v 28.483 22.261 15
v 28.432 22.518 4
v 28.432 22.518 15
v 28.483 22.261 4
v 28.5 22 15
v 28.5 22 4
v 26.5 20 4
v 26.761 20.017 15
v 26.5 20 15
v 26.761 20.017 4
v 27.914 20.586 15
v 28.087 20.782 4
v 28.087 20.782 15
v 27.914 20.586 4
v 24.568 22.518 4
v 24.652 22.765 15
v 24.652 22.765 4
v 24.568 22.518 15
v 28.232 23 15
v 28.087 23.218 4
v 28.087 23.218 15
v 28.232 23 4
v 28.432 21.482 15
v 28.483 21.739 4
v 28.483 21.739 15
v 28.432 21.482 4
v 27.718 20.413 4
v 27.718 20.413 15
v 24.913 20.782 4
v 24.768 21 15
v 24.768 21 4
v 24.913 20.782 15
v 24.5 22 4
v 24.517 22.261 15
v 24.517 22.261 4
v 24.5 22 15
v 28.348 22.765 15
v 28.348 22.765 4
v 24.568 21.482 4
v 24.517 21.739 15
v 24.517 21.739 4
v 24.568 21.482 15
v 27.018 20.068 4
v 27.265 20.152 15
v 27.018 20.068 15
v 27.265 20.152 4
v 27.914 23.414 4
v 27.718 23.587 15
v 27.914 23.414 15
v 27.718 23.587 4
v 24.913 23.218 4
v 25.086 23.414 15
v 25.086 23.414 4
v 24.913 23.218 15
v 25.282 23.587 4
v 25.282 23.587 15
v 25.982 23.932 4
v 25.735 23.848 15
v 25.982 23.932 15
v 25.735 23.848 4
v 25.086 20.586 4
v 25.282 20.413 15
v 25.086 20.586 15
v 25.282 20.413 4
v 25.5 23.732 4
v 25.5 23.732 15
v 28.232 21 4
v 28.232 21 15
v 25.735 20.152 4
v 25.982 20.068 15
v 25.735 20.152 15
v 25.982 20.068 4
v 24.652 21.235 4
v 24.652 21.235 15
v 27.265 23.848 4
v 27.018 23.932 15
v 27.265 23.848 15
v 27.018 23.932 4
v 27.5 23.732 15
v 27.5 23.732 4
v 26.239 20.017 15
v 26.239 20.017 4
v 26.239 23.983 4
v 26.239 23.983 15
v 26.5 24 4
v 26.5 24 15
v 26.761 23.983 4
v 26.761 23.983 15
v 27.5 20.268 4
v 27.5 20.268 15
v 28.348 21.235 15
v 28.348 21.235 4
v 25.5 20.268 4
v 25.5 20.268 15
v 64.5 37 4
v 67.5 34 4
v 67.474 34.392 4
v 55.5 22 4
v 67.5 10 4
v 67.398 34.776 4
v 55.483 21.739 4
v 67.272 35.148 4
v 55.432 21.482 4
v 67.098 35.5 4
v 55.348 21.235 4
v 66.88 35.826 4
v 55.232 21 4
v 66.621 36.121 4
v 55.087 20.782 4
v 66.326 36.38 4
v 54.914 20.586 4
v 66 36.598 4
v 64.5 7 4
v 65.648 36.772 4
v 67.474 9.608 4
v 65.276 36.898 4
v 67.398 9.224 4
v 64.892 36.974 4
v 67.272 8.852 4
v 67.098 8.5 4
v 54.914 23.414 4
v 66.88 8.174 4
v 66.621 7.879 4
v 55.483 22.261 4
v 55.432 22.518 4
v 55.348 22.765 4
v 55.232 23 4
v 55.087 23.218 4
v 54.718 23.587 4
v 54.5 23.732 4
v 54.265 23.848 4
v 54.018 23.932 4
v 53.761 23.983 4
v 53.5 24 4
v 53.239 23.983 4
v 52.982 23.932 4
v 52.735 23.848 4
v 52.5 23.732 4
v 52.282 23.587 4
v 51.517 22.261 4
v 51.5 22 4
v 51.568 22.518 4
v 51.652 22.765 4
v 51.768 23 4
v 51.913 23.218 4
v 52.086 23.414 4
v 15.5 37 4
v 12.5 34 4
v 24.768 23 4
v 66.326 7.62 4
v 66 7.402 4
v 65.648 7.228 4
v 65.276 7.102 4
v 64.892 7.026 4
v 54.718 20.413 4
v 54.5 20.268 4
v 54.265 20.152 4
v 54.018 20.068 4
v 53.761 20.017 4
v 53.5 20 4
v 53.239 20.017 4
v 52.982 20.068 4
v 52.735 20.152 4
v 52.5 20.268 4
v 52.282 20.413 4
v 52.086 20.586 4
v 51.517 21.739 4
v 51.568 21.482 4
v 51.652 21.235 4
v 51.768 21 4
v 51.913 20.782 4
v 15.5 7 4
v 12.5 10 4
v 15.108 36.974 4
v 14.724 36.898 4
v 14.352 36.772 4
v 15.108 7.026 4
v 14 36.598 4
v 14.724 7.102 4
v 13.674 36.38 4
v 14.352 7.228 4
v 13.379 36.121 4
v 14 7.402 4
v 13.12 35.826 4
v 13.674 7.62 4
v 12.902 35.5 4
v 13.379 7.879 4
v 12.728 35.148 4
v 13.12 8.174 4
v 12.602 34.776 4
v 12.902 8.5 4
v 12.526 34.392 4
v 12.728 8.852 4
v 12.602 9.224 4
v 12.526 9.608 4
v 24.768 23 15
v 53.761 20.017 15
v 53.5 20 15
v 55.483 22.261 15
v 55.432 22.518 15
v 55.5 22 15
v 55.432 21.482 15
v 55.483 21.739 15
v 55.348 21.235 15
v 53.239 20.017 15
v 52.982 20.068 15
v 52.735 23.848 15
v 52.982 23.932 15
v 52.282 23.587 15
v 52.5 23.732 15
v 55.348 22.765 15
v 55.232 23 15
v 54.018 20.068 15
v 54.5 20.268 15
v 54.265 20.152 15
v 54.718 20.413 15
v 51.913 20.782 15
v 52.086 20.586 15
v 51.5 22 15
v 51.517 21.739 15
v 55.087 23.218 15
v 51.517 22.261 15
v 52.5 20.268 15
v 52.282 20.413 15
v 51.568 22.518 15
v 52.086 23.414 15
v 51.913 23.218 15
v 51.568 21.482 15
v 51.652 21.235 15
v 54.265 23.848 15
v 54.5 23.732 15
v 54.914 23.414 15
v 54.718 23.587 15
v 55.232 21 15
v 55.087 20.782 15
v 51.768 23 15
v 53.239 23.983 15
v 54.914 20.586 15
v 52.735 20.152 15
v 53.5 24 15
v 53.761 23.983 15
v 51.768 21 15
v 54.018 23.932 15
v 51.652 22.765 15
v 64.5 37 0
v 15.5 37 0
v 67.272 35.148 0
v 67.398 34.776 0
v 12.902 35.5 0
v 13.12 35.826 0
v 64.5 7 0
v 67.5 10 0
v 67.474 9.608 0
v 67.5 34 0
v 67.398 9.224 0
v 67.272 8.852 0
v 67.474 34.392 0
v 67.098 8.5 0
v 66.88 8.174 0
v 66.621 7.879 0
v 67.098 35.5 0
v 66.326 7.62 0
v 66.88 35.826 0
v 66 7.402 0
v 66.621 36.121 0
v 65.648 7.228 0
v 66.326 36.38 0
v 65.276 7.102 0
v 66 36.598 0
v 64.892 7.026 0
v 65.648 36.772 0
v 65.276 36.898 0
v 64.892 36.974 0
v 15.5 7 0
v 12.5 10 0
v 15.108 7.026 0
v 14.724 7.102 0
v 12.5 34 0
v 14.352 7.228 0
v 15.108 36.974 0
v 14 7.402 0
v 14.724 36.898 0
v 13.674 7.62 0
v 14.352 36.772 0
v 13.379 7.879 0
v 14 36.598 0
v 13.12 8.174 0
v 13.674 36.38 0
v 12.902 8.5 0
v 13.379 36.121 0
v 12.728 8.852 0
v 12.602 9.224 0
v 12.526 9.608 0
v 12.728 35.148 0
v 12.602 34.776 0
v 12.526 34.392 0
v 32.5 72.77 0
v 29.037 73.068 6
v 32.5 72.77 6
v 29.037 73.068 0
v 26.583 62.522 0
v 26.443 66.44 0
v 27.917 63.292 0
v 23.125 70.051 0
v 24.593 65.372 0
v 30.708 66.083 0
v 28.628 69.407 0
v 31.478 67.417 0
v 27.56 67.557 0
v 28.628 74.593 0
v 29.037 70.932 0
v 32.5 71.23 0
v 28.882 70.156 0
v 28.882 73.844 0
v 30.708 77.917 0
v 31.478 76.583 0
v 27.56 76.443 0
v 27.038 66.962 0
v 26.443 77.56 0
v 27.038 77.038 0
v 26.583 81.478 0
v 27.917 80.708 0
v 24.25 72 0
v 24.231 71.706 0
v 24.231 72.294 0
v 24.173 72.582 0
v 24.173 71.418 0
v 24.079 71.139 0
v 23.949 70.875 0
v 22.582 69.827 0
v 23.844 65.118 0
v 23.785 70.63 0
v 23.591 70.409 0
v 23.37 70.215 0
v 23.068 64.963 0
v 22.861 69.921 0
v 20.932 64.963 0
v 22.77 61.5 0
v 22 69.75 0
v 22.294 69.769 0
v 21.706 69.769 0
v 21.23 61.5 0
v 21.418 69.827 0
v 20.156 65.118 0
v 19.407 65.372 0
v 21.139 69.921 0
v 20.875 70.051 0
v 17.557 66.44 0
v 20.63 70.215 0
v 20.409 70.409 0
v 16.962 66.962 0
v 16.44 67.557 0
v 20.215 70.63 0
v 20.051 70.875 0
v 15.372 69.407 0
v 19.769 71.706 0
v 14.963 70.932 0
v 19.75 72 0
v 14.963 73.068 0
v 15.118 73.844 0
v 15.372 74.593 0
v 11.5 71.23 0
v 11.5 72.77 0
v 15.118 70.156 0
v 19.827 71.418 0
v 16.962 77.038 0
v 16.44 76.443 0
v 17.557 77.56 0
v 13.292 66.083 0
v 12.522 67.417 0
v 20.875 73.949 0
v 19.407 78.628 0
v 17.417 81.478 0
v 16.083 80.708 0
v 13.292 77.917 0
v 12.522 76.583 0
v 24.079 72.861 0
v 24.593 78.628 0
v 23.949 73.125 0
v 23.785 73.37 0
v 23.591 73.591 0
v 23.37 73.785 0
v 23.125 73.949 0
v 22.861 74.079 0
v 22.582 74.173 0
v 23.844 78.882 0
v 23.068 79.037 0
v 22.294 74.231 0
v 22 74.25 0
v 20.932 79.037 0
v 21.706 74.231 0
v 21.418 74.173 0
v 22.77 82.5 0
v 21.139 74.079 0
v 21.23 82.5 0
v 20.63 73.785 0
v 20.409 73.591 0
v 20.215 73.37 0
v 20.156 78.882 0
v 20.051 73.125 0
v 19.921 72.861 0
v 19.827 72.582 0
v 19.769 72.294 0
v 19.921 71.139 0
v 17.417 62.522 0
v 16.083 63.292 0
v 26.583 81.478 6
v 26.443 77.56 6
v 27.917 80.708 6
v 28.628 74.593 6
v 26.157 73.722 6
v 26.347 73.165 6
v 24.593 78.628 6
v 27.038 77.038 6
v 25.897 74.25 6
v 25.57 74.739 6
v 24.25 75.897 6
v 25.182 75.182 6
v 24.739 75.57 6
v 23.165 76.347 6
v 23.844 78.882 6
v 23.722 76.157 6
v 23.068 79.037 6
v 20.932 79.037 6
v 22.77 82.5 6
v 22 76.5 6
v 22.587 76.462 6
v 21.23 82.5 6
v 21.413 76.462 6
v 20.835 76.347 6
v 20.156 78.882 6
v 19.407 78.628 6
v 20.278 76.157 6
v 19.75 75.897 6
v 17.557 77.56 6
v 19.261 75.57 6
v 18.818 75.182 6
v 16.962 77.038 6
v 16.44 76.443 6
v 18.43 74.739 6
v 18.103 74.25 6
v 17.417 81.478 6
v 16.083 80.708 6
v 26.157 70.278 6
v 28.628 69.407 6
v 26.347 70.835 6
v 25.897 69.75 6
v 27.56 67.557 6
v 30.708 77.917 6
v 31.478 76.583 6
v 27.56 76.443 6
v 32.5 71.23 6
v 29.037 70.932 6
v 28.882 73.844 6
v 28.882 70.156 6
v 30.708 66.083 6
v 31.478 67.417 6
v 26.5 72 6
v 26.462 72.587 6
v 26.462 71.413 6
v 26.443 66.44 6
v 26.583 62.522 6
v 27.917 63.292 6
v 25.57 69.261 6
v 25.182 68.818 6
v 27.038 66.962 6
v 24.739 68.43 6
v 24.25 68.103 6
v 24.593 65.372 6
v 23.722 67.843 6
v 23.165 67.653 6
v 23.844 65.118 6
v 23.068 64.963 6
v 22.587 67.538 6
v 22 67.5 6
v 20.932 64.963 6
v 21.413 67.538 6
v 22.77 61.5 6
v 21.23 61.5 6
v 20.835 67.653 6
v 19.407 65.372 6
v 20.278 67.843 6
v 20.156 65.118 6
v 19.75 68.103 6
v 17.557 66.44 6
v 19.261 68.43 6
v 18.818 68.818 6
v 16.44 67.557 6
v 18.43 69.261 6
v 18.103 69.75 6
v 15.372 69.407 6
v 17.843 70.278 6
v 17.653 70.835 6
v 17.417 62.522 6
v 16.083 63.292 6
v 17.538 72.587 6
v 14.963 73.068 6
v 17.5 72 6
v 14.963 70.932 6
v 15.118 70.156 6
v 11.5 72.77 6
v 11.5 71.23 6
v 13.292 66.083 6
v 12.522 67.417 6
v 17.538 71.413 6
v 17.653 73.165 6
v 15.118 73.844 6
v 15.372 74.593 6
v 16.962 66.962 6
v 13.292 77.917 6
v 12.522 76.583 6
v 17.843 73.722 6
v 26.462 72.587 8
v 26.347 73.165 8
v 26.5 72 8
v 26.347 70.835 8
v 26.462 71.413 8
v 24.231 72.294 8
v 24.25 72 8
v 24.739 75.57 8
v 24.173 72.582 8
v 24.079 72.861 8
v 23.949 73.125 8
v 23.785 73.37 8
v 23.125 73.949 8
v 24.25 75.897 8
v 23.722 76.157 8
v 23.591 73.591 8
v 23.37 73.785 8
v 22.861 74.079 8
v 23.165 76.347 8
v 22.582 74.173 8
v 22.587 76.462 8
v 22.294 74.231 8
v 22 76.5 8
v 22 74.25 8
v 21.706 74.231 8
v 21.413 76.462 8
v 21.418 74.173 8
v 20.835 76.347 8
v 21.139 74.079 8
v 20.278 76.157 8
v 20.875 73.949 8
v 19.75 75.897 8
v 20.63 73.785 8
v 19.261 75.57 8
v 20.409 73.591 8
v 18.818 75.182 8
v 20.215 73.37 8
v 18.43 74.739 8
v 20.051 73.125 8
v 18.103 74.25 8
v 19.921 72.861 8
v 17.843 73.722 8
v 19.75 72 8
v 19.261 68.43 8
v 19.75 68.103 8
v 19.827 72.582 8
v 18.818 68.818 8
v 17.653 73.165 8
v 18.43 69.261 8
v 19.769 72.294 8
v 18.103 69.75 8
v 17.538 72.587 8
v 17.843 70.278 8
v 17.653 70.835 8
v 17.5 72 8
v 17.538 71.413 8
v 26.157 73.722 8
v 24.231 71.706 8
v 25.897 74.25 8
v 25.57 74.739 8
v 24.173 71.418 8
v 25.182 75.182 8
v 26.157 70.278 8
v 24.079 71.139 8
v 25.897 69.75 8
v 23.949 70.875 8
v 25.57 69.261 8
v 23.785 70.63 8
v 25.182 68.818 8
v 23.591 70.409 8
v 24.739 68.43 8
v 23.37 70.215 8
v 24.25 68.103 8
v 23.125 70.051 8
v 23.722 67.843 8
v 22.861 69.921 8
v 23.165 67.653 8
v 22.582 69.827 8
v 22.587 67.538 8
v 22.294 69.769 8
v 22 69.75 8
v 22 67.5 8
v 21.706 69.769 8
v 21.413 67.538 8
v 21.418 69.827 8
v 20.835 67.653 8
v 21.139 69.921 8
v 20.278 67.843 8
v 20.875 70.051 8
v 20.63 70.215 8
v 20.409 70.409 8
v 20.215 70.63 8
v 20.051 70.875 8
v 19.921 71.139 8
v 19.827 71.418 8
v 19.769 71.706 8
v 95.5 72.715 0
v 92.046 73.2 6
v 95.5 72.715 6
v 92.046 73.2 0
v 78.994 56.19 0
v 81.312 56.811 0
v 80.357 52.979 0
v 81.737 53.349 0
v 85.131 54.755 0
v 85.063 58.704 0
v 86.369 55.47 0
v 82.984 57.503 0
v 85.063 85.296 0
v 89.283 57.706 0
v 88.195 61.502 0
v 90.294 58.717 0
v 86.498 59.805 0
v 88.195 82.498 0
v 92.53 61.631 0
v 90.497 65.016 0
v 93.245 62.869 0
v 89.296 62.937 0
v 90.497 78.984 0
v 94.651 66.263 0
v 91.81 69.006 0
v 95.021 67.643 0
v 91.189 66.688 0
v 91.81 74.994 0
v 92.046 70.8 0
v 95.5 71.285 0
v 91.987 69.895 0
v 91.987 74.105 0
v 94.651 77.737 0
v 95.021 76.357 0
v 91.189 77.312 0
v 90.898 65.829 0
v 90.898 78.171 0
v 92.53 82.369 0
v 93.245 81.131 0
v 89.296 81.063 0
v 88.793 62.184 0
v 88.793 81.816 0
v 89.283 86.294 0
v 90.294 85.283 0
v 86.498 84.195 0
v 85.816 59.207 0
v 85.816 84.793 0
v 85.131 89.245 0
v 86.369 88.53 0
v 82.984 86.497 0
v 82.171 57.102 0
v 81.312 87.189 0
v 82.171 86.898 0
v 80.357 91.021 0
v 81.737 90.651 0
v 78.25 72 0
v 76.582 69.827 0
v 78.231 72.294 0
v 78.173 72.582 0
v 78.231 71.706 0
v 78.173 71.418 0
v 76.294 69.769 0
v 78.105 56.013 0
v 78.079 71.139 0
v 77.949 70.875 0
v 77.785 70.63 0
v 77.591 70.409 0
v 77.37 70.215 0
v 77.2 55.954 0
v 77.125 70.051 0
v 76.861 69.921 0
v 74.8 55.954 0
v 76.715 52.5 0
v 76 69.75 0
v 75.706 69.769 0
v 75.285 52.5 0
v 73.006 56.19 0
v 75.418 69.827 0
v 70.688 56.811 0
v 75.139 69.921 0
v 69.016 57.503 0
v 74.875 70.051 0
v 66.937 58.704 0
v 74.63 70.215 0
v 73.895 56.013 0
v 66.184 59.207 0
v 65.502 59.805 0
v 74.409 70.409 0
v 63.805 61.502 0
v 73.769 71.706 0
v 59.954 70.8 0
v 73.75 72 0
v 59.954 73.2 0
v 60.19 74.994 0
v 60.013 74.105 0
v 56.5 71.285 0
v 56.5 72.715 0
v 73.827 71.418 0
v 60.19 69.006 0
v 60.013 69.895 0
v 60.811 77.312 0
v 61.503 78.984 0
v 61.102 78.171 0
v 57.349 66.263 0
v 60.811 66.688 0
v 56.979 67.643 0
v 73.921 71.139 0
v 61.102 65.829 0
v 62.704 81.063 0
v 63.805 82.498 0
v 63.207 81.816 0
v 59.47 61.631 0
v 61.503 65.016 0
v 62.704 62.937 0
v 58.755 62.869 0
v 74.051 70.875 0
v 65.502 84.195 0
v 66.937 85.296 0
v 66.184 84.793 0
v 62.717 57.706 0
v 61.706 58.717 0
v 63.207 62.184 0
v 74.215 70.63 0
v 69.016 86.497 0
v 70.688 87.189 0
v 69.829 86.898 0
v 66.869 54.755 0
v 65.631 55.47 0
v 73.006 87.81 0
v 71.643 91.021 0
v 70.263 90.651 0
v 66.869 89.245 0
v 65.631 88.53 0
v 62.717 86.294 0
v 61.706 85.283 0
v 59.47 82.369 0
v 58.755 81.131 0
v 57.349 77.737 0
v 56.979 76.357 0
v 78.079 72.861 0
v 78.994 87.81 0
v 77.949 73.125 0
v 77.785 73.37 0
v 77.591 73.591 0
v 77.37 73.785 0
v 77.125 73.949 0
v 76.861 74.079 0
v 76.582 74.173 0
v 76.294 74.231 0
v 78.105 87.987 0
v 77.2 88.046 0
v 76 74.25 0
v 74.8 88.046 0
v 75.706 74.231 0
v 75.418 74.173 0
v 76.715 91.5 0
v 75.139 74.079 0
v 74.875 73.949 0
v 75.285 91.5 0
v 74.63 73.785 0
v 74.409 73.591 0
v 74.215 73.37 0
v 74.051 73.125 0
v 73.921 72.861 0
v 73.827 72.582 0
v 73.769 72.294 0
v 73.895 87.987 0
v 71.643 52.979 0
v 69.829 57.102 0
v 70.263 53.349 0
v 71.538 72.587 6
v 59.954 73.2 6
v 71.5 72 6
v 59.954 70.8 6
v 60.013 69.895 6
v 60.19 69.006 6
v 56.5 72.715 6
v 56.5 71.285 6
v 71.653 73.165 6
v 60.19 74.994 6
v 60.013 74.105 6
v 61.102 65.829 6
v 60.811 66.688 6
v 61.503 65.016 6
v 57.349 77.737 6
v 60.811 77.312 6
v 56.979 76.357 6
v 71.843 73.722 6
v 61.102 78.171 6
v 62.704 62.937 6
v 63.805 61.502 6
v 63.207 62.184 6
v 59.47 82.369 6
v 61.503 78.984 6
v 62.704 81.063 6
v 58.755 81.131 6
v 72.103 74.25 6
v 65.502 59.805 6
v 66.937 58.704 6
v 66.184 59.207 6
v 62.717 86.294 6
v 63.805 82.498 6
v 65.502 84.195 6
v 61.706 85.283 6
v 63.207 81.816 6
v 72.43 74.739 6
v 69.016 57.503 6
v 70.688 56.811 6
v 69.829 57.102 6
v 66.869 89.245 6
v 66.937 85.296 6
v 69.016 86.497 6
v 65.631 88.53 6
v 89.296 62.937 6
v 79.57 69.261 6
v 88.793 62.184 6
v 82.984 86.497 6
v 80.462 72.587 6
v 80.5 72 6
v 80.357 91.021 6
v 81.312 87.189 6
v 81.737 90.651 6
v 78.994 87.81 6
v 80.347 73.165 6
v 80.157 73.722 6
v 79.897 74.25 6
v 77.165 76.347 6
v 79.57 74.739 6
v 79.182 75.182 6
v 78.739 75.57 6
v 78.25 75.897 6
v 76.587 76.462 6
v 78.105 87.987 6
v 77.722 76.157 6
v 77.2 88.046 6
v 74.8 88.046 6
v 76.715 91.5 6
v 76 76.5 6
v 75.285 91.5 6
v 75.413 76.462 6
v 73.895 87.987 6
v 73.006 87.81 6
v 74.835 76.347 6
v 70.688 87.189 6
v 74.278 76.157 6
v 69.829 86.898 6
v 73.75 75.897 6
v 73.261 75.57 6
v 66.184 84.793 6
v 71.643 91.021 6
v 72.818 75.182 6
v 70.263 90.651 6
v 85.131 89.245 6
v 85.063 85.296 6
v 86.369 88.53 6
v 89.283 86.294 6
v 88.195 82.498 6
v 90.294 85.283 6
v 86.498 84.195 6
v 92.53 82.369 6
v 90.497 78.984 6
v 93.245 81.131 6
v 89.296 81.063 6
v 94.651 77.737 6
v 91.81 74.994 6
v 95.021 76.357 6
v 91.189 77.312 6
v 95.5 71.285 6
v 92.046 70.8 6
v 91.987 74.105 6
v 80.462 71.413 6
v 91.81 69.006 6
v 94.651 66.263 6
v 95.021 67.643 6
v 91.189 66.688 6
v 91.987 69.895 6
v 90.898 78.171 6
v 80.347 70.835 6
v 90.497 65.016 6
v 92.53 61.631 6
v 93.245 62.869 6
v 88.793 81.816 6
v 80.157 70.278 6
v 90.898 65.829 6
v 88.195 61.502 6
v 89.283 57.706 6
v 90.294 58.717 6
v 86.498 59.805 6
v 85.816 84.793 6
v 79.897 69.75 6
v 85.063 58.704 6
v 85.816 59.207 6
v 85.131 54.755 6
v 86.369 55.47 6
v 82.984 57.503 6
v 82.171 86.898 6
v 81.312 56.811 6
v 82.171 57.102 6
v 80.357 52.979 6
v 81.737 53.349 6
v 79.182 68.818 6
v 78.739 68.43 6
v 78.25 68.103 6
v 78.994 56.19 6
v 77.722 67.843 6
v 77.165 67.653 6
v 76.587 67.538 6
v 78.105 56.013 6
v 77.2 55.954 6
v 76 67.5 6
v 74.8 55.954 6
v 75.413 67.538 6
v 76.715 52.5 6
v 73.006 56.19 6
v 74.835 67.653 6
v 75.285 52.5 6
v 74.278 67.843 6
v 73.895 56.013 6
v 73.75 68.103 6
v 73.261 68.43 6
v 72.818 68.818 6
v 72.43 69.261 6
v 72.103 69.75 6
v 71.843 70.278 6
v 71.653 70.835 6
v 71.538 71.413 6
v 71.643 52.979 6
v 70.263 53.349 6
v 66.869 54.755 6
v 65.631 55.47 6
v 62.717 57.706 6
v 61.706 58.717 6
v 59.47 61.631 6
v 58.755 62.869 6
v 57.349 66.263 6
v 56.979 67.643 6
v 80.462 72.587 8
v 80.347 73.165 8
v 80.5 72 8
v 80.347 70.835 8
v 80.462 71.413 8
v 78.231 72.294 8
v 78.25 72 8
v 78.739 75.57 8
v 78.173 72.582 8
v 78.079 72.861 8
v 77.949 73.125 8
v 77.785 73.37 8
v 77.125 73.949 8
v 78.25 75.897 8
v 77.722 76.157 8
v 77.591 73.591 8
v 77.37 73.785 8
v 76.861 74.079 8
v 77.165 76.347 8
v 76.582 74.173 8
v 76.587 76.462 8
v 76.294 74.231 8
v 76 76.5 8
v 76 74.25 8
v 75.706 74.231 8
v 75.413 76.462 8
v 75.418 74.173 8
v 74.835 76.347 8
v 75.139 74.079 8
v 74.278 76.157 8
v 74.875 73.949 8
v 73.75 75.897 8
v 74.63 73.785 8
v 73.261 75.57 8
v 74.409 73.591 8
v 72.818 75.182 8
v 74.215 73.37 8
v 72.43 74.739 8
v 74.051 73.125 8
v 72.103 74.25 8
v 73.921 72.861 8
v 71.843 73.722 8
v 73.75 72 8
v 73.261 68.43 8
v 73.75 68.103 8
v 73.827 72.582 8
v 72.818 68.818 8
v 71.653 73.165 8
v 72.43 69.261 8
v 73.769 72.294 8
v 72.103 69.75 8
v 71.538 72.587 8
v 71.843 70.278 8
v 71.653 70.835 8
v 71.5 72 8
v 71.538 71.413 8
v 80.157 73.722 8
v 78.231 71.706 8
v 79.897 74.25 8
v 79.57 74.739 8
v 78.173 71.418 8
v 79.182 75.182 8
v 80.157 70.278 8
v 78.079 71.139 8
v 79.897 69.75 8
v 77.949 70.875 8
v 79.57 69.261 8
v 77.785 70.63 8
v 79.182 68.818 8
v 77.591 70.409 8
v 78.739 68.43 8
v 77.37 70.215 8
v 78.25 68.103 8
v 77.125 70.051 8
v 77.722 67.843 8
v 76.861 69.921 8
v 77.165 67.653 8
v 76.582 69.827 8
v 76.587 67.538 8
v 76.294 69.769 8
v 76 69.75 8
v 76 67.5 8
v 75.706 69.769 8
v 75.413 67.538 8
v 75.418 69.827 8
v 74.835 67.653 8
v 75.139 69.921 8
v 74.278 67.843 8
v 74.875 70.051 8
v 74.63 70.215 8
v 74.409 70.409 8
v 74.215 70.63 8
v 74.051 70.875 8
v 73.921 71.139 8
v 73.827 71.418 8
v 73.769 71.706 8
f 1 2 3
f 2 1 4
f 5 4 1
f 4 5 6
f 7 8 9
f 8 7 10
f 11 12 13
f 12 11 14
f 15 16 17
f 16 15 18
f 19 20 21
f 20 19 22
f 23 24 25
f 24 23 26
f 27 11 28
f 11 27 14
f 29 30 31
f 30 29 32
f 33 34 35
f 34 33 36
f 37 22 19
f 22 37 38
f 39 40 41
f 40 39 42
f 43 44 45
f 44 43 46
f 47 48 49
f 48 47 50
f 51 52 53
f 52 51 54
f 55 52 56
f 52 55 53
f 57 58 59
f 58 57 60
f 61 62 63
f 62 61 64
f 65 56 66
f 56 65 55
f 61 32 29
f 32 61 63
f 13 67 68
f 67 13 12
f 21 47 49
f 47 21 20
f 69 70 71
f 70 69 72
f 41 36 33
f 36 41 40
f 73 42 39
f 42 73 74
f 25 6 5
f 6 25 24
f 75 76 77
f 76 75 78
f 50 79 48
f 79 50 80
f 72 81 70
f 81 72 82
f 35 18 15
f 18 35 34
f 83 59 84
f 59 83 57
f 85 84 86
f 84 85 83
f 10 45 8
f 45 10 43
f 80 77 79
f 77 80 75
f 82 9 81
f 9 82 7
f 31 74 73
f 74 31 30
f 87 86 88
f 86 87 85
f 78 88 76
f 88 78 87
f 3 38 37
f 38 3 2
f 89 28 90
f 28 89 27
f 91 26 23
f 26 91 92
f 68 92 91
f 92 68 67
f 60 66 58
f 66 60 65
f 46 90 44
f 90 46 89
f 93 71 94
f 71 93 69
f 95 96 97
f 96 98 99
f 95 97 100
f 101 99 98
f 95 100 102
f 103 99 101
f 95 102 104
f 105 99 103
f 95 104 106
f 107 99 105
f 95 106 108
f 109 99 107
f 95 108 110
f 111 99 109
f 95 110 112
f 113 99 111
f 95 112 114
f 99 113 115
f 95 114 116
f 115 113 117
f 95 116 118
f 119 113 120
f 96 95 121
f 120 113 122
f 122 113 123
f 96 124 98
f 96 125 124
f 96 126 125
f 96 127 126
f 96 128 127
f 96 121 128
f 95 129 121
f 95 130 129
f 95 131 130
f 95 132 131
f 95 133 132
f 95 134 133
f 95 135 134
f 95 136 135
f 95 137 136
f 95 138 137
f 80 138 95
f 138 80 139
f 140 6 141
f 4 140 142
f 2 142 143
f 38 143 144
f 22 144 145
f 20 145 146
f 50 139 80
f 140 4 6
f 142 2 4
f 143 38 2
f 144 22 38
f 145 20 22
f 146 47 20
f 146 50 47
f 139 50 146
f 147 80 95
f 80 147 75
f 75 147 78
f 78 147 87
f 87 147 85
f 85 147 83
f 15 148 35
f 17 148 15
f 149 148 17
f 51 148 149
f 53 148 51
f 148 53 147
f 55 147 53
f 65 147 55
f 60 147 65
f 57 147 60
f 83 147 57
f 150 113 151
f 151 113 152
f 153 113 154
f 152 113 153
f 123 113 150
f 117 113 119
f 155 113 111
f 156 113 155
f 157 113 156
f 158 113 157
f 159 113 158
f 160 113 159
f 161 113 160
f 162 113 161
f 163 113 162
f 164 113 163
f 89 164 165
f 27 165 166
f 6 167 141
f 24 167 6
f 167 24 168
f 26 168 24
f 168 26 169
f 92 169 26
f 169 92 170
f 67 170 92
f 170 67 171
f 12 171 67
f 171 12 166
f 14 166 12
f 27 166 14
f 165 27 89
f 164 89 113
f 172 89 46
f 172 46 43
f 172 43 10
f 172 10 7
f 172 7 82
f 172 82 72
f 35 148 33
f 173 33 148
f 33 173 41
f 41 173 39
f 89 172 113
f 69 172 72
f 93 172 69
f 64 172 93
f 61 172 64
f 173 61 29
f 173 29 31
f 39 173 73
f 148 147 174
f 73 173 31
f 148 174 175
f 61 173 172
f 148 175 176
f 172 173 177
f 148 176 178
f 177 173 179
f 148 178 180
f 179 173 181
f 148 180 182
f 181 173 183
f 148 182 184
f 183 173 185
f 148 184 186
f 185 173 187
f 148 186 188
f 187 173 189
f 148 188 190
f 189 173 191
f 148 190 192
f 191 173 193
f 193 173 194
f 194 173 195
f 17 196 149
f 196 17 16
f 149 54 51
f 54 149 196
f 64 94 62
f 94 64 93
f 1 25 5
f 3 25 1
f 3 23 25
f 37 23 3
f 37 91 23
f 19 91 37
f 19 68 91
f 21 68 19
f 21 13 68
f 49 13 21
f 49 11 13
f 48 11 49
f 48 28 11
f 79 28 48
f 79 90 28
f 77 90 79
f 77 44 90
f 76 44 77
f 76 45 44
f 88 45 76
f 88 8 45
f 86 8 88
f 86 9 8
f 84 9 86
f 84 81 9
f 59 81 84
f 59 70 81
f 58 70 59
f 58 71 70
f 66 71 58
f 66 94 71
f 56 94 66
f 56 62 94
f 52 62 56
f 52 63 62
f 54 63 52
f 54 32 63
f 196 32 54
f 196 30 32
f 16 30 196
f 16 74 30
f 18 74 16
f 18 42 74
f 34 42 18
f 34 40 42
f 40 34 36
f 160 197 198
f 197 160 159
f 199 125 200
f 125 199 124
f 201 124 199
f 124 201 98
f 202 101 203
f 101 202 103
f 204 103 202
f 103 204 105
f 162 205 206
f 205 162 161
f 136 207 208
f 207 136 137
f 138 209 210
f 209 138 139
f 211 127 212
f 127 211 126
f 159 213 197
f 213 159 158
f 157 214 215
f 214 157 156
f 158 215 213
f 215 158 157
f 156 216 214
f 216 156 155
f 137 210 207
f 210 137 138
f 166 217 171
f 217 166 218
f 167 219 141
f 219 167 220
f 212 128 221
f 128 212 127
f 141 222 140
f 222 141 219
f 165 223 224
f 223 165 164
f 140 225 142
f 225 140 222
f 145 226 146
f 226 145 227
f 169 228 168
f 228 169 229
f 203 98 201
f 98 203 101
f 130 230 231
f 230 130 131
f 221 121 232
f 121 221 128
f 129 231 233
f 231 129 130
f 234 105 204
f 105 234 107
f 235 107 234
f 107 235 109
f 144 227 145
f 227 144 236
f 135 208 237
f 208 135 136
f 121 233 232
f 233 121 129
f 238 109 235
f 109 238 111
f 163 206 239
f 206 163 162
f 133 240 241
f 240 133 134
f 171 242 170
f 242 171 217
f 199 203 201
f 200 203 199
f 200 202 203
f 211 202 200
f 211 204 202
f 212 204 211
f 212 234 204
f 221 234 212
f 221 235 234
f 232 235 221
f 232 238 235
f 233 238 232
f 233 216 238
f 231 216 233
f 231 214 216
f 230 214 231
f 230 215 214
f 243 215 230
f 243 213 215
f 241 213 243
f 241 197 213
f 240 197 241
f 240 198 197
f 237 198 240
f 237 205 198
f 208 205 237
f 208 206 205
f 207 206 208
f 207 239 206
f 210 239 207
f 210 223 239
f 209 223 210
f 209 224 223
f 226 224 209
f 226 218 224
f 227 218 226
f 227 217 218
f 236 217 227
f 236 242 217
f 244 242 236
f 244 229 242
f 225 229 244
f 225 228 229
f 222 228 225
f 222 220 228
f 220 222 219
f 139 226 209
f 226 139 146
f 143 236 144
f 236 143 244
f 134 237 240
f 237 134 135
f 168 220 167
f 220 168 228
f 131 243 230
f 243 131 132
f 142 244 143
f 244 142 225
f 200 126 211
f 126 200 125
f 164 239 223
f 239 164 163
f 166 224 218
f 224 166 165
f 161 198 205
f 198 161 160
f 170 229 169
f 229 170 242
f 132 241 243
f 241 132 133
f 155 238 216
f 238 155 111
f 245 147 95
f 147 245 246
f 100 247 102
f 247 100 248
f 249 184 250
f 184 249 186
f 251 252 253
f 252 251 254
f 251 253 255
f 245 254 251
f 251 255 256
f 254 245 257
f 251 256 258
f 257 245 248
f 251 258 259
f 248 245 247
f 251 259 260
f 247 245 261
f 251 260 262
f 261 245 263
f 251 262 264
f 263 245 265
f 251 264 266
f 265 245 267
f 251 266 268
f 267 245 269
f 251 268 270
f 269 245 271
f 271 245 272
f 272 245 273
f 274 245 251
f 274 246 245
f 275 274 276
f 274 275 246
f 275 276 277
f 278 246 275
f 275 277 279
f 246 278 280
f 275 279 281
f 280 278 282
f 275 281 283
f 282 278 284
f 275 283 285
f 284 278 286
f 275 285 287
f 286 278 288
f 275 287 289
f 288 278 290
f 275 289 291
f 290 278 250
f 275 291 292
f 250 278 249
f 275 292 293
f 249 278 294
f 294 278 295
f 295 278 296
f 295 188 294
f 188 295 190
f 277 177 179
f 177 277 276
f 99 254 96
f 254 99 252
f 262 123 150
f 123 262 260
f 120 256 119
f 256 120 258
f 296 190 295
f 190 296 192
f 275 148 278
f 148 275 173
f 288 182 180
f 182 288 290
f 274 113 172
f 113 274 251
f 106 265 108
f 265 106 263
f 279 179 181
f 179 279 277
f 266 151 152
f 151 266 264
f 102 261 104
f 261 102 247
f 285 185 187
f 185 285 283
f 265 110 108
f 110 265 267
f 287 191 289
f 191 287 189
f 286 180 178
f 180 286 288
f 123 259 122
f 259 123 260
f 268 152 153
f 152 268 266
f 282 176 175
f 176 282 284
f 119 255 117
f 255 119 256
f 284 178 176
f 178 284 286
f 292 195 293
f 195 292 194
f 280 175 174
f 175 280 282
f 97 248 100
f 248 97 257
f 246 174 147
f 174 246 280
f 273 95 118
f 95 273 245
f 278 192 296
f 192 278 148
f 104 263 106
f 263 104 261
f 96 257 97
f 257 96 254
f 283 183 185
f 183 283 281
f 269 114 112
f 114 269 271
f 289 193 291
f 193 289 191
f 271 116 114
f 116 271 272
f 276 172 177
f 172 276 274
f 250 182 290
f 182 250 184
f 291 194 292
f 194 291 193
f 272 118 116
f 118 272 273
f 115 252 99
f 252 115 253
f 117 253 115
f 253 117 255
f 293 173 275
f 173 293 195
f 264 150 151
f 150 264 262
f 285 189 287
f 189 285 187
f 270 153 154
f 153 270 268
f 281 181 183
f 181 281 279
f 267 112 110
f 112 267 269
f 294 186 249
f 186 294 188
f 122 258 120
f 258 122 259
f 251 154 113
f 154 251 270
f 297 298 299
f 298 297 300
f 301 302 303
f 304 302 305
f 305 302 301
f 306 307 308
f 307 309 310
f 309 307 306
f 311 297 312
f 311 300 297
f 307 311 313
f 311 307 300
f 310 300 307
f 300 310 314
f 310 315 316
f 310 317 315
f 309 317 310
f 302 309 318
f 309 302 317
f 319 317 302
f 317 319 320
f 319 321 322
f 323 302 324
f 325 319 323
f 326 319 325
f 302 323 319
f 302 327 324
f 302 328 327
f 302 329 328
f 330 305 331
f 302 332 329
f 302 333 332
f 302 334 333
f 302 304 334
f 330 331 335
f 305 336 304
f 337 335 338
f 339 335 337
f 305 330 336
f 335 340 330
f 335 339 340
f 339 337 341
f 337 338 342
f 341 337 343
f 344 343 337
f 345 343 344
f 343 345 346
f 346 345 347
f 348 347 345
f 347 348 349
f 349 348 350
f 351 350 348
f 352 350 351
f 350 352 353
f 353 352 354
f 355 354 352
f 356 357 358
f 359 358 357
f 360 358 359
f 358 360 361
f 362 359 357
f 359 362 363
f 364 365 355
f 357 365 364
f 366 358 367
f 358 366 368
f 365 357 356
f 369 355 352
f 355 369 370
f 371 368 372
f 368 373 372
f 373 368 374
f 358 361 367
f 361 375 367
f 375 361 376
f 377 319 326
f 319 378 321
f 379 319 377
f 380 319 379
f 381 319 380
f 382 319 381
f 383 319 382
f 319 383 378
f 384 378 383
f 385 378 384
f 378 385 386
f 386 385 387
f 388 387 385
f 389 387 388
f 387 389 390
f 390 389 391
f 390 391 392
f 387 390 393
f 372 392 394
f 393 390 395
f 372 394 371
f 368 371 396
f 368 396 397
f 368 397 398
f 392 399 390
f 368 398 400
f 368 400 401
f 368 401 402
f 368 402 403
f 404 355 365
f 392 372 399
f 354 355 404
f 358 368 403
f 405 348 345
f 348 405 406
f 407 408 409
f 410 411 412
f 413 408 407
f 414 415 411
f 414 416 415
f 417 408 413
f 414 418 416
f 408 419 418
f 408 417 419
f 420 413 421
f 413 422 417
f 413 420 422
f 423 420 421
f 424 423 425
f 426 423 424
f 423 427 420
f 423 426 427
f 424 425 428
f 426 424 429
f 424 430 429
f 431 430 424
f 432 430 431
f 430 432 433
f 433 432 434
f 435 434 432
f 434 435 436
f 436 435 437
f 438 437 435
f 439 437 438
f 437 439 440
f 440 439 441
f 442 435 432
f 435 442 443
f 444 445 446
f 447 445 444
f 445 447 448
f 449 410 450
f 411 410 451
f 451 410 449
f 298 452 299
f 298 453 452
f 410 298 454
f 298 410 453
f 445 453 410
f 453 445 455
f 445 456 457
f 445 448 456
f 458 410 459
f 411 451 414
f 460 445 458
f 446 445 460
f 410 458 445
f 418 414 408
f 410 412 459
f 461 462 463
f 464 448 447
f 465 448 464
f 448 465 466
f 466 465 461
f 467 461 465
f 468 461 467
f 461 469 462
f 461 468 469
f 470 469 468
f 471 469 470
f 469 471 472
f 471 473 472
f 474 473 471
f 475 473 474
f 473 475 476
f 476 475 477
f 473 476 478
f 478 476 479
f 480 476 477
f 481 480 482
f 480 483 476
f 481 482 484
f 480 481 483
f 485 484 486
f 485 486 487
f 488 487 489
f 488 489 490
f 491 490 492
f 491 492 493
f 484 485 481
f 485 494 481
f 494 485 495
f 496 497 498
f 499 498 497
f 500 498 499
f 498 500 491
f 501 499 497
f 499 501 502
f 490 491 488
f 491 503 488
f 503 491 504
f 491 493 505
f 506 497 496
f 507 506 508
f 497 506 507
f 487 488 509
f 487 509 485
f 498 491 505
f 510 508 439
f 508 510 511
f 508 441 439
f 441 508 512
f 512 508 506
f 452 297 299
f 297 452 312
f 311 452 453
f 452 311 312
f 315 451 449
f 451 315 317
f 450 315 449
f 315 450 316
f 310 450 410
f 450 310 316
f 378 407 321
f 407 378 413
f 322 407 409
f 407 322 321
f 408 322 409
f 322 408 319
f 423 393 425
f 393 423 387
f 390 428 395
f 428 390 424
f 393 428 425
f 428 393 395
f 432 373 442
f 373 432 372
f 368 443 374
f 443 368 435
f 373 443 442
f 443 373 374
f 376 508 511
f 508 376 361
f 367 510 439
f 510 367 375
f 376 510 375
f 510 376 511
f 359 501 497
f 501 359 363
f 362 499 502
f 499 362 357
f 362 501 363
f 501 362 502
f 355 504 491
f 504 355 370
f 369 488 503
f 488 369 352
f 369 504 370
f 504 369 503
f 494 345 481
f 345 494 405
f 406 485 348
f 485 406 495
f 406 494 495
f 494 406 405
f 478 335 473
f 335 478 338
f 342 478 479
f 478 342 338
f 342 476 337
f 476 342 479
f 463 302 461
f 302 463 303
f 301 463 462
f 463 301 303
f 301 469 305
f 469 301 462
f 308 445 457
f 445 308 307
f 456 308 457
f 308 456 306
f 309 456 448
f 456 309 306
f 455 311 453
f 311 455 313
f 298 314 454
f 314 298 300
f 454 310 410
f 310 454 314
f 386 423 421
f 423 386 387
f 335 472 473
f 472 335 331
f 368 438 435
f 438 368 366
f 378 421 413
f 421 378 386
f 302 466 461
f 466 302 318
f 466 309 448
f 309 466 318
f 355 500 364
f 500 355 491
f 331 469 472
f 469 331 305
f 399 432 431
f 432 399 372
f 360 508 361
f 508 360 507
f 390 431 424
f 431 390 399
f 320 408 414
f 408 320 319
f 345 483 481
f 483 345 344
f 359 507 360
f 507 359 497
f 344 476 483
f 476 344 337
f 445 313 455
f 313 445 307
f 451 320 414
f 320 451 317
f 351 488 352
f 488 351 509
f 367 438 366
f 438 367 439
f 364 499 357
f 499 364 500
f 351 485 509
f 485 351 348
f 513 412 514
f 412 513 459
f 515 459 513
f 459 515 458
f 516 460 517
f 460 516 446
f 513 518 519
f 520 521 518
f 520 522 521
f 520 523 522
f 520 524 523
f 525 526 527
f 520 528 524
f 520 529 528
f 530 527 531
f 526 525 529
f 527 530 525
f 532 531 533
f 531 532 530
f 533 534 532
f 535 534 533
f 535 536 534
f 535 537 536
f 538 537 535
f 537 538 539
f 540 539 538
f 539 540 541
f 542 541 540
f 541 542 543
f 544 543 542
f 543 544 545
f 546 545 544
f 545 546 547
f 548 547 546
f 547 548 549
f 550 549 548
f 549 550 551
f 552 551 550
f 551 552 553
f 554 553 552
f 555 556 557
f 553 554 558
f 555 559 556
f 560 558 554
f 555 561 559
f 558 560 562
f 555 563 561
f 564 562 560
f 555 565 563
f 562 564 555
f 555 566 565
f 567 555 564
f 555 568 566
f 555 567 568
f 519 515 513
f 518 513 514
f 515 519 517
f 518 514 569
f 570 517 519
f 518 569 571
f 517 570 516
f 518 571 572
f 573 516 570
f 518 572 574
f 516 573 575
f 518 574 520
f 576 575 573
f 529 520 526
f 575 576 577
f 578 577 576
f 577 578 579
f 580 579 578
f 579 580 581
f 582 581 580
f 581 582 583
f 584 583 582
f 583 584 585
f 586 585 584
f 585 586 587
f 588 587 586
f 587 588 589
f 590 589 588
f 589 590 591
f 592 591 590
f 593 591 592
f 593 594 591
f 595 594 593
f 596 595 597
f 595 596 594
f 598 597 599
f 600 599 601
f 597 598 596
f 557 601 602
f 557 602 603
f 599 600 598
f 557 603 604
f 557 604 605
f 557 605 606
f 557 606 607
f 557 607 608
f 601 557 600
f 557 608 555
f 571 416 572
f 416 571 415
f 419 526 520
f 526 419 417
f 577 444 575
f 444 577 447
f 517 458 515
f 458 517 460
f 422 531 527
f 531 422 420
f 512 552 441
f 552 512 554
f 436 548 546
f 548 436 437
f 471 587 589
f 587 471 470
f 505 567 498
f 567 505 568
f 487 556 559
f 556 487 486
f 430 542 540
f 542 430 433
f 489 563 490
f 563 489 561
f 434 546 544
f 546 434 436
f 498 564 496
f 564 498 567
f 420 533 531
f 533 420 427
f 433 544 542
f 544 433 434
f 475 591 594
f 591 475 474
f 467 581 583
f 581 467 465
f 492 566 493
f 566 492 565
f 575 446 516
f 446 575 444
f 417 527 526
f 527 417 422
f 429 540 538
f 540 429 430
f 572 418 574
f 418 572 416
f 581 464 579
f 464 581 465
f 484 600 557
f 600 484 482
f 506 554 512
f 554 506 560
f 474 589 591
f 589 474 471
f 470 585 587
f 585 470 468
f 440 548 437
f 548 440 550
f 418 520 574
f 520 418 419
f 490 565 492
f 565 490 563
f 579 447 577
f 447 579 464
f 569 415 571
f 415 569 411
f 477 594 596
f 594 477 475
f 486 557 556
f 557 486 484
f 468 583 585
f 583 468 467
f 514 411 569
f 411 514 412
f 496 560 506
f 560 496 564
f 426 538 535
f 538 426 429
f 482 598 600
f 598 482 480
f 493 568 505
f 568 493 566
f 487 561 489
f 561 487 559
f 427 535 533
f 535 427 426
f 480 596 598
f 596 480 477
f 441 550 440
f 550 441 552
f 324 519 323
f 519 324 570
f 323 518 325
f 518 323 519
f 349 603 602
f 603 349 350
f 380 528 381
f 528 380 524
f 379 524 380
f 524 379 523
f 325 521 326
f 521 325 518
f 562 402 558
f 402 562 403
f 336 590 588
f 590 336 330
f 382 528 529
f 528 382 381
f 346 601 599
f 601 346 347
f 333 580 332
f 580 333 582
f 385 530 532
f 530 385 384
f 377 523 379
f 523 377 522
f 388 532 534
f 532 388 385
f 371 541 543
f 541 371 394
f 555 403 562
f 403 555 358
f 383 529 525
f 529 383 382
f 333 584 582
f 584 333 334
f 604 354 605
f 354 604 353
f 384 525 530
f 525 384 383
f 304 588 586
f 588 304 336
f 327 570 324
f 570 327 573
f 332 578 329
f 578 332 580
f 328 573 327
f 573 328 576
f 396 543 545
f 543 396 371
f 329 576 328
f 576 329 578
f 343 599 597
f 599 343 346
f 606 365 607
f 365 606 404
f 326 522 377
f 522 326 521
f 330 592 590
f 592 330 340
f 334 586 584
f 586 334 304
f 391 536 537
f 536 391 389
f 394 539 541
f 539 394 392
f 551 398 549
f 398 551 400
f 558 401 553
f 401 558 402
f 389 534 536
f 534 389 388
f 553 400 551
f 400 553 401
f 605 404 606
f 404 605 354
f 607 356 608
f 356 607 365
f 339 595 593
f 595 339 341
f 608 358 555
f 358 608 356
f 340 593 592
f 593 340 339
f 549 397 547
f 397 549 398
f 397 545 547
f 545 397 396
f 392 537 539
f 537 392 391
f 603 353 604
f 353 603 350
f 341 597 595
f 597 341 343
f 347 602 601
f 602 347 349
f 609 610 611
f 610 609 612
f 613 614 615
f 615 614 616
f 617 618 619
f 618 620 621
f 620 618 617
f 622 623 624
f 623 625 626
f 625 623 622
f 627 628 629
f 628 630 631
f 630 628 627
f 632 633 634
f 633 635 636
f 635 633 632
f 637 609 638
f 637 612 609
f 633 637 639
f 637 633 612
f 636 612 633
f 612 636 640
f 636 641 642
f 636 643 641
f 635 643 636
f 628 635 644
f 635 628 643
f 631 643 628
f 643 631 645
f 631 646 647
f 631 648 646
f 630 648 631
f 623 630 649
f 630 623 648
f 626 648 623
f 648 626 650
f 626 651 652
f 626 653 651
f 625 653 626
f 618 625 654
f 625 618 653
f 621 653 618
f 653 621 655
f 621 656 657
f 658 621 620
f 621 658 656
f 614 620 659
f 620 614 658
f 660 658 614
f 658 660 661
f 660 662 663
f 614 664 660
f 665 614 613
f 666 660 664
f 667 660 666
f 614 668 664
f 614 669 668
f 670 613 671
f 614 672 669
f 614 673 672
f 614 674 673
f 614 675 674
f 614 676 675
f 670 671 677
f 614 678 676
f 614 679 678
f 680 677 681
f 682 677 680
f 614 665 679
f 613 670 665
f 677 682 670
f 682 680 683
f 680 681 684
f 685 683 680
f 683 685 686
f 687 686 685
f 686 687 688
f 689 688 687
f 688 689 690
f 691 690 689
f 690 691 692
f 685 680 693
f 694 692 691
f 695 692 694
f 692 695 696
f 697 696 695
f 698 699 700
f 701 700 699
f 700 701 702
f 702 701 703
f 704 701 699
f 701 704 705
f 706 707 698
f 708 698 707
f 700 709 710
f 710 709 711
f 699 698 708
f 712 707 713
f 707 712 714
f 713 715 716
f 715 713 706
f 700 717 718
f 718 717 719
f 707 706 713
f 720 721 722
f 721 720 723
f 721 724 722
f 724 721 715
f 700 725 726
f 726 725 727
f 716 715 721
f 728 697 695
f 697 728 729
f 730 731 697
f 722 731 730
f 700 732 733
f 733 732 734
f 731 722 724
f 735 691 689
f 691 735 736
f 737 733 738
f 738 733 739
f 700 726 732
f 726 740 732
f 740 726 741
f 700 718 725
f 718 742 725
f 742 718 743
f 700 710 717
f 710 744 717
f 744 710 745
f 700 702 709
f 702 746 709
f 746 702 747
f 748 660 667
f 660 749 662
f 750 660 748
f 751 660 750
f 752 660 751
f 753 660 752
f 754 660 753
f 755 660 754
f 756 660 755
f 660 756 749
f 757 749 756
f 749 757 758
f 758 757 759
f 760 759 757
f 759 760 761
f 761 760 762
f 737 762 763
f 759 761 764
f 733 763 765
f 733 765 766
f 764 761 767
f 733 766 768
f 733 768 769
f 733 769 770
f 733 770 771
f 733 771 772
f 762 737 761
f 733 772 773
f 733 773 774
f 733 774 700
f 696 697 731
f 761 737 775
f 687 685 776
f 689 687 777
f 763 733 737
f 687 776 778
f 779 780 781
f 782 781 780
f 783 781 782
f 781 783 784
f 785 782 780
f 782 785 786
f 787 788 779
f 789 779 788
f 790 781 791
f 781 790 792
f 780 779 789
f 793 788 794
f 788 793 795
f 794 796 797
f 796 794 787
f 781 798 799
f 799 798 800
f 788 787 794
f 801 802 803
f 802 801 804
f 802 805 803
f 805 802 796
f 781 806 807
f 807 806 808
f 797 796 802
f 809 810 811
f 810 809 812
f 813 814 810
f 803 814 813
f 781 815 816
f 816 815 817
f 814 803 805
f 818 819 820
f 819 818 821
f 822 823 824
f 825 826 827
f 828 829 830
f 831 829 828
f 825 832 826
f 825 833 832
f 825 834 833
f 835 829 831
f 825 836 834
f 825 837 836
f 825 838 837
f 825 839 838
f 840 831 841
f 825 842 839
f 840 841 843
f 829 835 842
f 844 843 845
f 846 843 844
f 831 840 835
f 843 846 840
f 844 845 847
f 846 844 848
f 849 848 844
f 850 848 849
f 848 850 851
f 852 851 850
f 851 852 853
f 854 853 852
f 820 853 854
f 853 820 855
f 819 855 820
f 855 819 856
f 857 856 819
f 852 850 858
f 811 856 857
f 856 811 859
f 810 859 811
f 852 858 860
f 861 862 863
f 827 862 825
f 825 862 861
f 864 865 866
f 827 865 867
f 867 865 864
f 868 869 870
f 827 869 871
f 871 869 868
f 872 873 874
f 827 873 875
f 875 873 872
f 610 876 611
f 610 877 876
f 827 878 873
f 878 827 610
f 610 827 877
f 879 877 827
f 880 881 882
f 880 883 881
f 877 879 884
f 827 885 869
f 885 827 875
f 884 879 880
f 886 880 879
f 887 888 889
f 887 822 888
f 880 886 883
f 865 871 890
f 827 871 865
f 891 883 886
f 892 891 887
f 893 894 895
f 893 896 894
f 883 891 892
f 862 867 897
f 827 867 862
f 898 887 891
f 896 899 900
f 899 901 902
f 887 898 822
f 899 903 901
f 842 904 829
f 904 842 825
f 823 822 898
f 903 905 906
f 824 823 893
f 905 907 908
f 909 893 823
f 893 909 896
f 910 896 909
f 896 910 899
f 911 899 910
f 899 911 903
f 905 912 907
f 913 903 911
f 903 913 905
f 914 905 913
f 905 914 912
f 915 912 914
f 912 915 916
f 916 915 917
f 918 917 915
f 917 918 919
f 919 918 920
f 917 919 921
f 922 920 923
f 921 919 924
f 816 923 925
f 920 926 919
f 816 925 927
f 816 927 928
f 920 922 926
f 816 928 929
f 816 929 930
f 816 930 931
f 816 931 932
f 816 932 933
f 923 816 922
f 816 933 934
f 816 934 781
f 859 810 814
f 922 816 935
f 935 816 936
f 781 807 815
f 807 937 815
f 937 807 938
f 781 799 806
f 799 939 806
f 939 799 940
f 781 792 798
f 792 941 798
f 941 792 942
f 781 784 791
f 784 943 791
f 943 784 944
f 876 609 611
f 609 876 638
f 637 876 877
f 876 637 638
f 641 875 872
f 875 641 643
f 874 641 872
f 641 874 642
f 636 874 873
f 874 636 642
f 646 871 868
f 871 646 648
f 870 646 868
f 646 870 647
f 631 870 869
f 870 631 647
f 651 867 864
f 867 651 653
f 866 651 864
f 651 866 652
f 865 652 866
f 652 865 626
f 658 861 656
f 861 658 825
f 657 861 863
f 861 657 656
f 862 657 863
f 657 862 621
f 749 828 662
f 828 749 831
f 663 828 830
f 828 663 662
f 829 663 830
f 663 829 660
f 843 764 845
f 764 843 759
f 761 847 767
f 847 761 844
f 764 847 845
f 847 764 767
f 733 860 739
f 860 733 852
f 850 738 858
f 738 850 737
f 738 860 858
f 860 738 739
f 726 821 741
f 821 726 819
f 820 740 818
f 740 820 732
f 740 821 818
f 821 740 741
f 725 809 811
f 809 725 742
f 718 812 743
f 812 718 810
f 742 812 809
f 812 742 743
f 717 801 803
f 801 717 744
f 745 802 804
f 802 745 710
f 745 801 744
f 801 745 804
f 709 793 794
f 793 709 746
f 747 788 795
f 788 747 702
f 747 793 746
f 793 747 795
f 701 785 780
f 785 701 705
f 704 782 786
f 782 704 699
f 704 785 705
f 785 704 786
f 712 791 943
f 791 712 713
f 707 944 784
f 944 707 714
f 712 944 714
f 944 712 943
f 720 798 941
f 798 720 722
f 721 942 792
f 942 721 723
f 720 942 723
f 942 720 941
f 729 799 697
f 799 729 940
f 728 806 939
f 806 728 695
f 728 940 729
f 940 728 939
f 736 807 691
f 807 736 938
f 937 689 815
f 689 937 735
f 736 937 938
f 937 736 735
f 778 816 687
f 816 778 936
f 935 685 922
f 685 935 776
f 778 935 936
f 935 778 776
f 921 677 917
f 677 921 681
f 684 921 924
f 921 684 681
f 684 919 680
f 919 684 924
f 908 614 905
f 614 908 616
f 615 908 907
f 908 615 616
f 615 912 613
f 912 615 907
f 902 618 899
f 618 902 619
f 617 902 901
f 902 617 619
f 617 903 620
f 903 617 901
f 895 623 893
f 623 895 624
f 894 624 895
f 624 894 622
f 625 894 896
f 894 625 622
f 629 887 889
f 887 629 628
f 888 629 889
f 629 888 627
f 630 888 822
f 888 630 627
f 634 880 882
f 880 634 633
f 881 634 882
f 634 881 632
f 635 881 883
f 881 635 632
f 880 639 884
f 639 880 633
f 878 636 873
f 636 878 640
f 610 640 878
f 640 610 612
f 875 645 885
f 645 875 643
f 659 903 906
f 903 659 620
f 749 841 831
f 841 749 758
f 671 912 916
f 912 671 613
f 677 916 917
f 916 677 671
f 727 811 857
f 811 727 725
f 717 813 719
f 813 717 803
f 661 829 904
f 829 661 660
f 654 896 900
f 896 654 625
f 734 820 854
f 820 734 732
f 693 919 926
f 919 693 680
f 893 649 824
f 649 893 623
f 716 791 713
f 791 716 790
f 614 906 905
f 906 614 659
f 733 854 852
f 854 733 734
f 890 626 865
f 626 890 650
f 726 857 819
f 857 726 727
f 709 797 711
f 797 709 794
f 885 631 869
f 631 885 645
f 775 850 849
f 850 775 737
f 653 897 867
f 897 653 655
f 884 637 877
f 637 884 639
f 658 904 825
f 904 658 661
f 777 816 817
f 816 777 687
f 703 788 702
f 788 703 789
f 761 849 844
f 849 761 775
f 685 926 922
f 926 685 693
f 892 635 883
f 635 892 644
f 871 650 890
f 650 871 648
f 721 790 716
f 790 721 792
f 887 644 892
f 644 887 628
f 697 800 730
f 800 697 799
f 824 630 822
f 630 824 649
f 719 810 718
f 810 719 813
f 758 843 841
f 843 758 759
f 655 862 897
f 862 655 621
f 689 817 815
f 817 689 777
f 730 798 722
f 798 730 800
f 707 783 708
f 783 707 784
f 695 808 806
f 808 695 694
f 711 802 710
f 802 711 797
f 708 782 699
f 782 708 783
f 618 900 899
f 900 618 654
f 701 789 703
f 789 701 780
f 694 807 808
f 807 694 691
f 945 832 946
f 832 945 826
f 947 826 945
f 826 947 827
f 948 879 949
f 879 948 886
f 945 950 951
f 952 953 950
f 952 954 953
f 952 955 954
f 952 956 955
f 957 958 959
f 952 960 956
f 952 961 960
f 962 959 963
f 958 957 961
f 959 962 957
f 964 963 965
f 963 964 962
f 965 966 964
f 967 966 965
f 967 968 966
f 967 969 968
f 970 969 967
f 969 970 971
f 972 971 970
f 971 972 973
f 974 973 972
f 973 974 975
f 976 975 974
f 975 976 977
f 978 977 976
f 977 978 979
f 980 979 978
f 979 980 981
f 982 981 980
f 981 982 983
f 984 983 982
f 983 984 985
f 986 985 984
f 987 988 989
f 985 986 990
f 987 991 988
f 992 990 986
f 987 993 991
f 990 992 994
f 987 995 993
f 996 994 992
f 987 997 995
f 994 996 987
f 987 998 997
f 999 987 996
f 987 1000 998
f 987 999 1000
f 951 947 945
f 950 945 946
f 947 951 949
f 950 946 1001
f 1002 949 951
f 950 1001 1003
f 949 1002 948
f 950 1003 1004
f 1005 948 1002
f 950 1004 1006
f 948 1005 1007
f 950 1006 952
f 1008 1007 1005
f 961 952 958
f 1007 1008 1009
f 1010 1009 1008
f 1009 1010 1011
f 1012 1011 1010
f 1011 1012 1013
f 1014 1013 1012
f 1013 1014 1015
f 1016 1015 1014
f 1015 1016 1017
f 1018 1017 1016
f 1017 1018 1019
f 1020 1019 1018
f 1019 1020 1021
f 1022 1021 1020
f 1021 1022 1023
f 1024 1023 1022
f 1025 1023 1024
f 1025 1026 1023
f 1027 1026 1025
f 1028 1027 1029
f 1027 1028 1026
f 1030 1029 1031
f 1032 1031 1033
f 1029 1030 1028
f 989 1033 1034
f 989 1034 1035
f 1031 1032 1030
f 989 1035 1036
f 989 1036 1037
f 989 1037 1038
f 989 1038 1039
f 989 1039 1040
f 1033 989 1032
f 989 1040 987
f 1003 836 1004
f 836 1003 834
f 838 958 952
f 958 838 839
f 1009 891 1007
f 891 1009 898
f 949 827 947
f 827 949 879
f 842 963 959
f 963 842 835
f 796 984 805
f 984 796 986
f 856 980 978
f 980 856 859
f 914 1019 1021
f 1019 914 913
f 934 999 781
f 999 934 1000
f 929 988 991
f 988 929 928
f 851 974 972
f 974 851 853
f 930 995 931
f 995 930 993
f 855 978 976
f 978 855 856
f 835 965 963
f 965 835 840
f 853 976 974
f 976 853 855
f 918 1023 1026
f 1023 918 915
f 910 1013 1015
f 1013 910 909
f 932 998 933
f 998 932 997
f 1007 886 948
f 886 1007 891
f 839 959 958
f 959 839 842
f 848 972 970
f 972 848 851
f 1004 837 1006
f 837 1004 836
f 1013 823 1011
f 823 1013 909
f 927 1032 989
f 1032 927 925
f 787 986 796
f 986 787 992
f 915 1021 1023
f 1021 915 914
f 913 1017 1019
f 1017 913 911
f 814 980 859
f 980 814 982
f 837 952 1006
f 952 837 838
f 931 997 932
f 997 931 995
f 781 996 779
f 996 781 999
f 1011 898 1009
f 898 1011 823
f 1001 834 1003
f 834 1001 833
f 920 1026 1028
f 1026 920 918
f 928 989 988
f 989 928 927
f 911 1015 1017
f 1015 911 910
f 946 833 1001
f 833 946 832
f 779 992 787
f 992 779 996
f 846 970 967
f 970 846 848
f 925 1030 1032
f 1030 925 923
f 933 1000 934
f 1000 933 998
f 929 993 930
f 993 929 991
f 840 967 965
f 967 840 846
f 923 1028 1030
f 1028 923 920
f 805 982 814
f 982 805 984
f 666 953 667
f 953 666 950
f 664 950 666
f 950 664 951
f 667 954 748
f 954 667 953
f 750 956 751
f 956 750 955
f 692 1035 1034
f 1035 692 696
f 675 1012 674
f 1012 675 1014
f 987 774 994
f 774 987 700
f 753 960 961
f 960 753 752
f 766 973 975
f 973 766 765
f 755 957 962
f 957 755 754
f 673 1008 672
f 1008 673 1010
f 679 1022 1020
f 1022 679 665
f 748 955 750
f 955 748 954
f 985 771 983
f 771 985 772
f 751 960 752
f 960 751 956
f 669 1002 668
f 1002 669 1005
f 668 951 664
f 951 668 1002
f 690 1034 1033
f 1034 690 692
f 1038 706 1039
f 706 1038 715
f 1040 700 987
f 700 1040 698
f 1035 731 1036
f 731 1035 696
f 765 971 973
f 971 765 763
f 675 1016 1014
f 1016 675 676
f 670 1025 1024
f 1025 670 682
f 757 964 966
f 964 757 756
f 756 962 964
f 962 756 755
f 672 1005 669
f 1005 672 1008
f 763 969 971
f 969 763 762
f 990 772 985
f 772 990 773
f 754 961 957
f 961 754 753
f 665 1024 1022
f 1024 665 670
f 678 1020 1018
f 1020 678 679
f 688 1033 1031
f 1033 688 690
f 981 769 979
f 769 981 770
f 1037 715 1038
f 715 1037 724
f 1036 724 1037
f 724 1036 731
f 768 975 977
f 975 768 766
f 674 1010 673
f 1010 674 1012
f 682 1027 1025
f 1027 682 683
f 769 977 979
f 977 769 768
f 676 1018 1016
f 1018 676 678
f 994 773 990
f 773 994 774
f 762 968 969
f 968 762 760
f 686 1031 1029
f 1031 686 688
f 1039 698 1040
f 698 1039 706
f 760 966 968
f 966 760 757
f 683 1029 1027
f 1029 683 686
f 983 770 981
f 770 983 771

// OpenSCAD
/*
Sample 103: Stirnradpaar auf Stiftbasis — 1:2
Generated from the FDM Mechanical Sample Library.
Units: millimetres.

Override examples:
  openscad -o custom.stl -D 'view="plate"' -D 'render_fn=64' model.scad
  openscad -o preview.png -D 'view="assembly"' model.scad
*/
use <../../../library/fdm_mechanisms.scad>

render_fn = is_undef(render_fn) ? 48 : render_fn;
view = is_undef(view) ? "plate" : view;
$fn = render_fn;

sample_spur_gears(
    view=view,
    teeth_a=12,
    teeth_b=24,
    module_size=1.5,
    clearance=0.25
);
